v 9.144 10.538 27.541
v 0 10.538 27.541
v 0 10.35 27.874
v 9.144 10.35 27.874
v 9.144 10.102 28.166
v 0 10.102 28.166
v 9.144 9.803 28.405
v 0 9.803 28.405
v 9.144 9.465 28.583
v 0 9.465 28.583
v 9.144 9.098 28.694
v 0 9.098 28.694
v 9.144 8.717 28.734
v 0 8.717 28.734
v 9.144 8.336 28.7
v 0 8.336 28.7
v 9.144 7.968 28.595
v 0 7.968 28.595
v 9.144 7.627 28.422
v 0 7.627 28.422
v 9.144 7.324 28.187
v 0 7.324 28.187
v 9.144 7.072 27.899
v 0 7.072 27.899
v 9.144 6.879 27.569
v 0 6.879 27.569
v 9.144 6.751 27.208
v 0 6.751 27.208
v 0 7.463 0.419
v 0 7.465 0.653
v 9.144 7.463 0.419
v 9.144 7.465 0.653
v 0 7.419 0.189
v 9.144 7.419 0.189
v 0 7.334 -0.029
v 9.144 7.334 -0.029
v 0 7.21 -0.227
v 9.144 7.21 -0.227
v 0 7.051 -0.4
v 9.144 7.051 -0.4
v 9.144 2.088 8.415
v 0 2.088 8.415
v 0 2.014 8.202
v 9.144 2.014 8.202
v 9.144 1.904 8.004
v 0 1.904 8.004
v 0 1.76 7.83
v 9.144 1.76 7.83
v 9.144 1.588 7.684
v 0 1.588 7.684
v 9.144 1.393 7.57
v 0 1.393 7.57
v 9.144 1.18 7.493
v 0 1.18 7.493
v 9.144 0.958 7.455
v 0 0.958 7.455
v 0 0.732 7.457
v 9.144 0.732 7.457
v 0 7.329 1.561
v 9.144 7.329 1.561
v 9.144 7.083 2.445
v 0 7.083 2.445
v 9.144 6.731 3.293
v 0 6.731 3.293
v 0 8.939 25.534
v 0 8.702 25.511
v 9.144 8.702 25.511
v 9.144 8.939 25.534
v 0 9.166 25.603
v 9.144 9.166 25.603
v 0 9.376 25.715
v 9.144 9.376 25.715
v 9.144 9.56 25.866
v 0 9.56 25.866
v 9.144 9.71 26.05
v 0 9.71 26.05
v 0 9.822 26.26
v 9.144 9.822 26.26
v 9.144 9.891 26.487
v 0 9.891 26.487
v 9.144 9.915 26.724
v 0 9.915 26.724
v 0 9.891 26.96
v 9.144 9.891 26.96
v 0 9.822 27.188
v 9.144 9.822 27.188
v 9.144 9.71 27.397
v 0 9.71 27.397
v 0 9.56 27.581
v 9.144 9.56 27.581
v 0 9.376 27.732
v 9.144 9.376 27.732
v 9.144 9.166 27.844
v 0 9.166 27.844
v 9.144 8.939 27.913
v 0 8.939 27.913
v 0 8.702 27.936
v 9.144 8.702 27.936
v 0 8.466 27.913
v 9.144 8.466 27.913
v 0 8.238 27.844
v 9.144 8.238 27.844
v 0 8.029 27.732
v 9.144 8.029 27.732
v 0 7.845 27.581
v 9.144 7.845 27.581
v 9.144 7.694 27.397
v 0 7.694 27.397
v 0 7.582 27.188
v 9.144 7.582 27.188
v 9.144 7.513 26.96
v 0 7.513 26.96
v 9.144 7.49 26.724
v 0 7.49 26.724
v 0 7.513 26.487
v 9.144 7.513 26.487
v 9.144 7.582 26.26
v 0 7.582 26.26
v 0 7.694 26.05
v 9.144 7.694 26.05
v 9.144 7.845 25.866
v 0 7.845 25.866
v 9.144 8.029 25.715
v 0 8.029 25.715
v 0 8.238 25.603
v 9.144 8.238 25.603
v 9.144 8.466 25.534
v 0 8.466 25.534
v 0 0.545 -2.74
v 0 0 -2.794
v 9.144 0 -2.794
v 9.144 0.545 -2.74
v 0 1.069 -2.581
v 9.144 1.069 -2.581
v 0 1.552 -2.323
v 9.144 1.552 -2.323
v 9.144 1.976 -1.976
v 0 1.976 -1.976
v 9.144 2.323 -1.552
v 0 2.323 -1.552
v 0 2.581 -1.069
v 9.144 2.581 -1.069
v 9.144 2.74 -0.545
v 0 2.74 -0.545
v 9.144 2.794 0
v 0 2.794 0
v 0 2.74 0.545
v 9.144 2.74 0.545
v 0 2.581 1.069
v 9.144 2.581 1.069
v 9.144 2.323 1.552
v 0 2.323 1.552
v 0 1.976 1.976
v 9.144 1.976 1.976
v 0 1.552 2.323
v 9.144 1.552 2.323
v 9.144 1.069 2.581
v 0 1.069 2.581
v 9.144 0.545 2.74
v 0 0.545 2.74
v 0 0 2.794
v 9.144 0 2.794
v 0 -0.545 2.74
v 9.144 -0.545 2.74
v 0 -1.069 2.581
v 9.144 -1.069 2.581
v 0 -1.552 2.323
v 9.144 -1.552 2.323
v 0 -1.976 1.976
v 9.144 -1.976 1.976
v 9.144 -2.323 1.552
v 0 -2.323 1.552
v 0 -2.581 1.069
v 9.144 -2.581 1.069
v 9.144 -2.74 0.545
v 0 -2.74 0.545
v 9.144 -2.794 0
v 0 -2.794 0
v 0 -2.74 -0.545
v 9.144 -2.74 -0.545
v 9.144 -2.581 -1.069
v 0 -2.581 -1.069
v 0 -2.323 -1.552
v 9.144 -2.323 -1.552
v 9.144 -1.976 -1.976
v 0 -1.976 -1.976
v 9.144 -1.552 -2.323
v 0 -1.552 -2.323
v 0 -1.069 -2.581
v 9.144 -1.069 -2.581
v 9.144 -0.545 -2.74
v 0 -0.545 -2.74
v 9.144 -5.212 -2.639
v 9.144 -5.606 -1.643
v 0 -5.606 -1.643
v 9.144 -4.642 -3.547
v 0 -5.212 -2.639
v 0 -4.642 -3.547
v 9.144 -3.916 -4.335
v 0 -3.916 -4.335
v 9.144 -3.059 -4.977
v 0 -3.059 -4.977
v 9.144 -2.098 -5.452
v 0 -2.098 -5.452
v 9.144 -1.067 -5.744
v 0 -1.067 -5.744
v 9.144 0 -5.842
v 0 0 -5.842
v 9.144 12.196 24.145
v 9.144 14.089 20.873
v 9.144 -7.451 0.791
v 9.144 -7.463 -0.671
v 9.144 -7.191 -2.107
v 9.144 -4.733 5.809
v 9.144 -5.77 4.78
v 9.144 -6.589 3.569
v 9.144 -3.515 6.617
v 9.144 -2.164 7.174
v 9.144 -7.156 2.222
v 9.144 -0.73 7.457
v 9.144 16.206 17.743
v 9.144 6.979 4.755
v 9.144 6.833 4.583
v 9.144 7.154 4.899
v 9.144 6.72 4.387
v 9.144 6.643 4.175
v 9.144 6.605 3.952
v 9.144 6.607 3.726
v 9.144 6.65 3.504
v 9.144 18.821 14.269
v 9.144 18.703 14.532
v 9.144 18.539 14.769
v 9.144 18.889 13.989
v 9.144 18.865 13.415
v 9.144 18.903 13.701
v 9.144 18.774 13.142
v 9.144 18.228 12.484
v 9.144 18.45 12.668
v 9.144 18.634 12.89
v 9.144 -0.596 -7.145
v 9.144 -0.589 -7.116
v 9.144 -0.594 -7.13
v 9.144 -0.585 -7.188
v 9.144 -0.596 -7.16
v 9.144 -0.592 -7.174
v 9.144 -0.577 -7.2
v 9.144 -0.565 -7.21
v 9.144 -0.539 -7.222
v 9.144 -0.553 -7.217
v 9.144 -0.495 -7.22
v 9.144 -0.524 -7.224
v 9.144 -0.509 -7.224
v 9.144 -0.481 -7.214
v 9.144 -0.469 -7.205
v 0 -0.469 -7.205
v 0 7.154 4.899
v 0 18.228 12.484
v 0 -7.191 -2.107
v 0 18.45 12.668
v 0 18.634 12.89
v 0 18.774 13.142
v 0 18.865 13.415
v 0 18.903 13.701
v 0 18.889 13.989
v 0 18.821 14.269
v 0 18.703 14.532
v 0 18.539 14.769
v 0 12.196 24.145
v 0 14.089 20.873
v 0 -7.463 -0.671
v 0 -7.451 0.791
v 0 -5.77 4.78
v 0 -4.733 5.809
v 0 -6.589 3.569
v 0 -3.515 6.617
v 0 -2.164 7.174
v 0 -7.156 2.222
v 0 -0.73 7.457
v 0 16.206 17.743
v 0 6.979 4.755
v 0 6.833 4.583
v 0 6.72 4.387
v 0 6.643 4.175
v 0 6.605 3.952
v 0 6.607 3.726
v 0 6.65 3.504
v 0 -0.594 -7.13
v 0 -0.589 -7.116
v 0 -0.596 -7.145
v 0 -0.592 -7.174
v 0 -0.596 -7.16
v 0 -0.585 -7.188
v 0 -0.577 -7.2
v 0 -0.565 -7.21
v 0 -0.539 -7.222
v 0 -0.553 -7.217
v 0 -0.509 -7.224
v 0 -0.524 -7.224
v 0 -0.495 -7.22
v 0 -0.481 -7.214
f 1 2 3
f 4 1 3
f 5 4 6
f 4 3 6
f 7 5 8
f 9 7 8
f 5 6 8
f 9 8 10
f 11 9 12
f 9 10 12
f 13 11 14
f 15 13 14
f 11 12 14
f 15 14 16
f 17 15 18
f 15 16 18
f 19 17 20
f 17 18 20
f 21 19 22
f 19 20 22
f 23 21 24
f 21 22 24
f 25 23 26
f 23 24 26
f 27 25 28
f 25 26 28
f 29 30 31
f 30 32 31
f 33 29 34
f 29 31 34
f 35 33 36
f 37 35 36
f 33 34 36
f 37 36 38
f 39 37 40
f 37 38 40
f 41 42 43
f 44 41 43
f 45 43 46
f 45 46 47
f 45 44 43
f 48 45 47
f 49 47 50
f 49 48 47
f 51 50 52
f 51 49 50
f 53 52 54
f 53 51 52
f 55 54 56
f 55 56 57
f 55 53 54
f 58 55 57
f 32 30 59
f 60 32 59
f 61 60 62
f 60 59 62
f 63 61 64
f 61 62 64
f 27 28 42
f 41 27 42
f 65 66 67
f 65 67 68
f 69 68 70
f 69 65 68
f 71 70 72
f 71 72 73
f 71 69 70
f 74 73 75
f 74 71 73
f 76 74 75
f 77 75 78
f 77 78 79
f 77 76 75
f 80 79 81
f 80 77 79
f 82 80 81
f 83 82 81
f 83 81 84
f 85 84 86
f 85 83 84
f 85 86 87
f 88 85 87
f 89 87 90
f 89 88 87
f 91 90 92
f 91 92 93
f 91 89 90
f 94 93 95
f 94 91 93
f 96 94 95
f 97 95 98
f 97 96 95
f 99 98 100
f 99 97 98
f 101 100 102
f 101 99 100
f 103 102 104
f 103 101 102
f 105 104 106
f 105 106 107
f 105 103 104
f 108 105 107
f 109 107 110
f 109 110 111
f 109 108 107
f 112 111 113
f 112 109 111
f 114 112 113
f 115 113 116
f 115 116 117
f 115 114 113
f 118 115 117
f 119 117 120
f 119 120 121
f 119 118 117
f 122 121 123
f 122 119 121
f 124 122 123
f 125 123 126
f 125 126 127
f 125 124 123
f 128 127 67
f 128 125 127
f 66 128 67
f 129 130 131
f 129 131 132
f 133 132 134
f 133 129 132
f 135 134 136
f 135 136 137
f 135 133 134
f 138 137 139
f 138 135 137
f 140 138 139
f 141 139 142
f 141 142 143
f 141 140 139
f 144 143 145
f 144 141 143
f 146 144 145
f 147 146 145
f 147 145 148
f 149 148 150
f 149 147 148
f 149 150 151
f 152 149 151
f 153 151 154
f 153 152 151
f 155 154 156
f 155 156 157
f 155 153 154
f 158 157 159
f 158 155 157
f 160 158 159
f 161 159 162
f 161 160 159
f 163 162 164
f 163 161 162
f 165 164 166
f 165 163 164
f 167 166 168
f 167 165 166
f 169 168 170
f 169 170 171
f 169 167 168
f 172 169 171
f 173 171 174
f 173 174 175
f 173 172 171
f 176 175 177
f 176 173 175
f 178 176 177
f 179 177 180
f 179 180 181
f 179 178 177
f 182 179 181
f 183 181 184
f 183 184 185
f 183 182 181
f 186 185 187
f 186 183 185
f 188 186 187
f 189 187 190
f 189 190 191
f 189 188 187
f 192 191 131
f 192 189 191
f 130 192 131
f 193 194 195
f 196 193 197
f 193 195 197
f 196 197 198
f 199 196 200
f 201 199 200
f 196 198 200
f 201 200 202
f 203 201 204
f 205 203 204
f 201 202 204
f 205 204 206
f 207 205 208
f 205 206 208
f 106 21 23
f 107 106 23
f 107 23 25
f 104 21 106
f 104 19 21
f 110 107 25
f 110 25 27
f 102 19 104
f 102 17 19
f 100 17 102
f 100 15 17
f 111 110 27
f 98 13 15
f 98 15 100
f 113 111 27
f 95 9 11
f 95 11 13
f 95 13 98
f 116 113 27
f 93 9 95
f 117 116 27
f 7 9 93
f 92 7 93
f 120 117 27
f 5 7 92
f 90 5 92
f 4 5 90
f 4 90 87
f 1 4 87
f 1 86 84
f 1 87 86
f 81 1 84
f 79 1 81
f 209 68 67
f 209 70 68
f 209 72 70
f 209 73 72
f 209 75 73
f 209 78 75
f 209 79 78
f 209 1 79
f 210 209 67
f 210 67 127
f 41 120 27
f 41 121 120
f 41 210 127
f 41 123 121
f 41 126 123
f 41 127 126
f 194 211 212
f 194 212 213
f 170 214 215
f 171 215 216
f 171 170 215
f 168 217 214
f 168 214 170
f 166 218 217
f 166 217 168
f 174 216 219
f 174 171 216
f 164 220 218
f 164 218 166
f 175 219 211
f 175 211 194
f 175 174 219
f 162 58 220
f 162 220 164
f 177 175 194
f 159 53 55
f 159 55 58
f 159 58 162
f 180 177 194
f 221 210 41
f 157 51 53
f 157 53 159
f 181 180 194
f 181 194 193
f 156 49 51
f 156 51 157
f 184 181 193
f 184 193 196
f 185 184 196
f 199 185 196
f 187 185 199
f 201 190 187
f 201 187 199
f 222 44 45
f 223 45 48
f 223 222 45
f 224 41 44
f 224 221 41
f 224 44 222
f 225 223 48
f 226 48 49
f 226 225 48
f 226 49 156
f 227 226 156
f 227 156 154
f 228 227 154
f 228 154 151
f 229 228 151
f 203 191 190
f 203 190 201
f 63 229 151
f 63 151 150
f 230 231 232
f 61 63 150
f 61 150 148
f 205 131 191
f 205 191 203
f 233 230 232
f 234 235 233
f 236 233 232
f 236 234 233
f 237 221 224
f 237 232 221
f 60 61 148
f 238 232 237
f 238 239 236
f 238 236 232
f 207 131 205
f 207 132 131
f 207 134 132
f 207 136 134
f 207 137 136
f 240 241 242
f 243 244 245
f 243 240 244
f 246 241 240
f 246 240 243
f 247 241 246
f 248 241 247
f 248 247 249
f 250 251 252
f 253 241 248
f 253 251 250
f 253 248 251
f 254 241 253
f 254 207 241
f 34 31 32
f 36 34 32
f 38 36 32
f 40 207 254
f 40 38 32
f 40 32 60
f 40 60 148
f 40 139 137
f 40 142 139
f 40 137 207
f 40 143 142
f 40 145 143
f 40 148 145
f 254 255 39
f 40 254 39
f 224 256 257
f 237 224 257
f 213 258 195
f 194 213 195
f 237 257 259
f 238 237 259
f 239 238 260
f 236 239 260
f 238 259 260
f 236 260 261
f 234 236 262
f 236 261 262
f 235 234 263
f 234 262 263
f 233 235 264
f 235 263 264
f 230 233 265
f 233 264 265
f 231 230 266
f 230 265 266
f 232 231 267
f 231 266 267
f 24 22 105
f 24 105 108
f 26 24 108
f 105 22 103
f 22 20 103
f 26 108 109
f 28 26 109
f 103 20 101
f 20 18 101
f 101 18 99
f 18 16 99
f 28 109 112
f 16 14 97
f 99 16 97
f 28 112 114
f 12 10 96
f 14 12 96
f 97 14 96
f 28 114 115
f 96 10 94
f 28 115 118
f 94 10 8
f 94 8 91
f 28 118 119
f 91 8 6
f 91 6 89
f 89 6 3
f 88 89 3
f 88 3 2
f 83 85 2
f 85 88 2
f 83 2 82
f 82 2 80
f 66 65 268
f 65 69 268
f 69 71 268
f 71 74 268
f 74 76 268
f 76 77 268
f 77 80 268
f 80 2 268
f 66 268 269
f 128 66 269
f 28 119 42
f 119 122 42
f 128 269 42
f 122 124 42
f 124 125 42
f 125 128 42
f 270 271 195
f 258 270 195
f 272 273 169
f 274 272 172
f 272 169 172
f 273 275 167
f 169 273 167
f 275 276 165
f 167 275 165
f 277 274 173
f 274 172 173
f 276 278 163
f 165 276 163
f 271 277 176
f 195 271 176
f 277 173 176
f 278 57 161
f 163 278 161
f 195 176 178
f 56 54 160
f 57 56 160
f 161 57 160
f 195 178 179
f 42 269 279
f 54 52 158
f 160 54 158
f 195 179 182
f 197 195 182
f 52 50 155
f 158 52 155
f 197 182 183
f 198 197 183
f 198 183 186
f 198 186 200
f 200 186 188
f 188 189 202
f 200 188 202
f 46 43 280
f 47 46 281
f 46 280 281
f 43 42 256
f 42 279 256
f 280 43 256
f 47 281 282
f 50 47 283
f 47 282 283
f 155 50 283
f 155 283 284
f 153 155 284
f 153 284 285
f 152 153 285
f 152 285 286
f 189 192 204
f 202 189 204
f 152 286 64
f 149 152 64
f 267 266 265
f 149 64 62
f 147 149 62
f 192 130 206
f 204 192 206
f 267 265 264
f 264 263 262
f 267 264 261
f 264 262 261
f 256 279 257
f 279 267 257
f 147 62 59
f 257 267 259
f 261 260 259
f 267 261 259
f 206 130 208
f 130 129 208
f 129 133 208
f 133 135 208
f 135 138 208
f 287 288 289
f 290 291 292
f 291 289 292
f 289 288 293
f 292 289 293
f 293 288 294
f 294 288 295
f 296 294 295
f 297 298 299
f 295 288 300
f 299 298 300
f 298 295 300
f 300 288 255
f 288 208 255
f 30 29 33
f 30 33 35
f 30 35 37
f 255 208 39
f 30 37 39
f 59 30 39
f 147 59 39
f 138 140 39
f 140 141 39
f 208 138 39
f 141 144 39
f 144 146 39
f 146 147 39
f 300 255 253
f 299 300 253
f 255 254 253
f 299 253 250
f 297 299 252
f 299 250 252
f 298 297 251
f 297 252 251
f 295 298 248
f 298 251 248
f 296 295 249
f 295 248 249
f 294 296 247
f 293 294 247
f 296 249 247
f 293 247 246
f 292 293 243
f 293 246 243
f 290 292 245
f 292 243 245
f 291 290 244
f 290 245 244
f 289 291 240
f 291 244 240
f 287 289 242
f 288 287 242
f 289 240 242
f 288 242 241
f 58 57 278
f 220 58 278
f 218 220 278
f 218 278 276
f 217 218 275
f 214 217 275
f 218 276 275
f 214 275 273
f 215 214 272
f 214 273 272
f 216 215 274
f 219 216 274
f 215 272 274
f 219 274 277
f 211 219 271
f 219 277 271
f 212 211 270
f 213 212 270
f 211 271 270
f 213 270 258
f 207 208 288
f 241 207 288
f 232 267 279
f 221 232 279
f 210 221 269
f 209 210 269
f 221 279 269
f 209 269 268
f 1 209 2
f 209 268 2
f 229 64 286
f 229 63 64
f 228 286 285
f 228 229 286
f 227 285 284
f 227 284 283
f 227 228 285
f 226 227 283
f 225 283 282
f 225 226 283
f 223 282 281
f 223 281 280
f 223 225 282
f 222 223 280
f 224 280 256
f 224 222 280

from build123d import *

# Parameters (mm, degrees)
SKETCH1_R           = 2.794
SKETCH1_R_2         = 1.212486465
BOSS_EXTRUDE1_DEPTH = 9.144
FILLET1_R           = 0.0762
FILLET2_R           = 1.27
FILLET3_R           = 1.27
FILLET4_R           = 1.27


with BuildPart() as part:
    # Sketch1 → Boss-Extrude1 (new body)
    with BuildSketch(Plane(origin=(0, 0, 0), x_dir=(0, 0, -1), z_dir=(1, 0, 0))):
        with BuildLine():
            Line((7.455728261, -0.746434927), (0, 7.493))
            ThreePointArc((0, 7.493), (-2.216071025, 7.157798419), (-4.23386886, 6.182184362))
            Line((-4.23386886, 6.182184362), (-12.48371449, 18.228392766))
            ThreePointArc((-12.48371449, 18.228392766), (-13.557344424, 18.890595677), (-14.768732641, 18.538839342))
            ThreePointArc((-14.768732641, 18.538839342), (-20.873202748, 14.088773121), (-27.541235985, 10.538424208))
            ThreePointArc((-27.541235985, 10.538424208), (-28.725821969, 8.525909619), (-27.207679666, 6.751451146))
            Line((-27.207679666, 6.751451146), (-7.27244078, 1.804620212))
            ThreePointArc((-7.27244078, 1.804620212), (-5.186520816, -5.407869342), (2.106798928, -7.190719524))
            Line((2.106798928, -7.190719524), (1.642588995, -5.606323697))
            ThreePointArc((1.642588995, -5.606323697), (4.675733574, -3.50235343), (5.842, 0))
            Line((5.842, 0), (7.455728261, -0.746434927))
        make_face()
        Circle(SKETCH1_R, mode=Mode.SUBTRACT)
        with Locations((-26.723594694, 8.702265656)):
            Circle(SKETCH1_R_2, mode=Mode.SUBTRACT)
    extrude(amount=BOSS_EXTRUDE1_DEPTH)

    # Fillet1
    fillet1_edges = [part.edges().sort_by_distance(p)[0] for p in [
        (4.572, -0.746434927, -7.455728261),
    ]]
    fillet(fillet1_edges, radius=FILLET1_R)

    # Fillet2
    fillet2_edges = [part.edges().sort_by_distance(p)[0] for p in [
        (4.572, 6.182184362, 4.23386886),
    ]]
    fillet(fillet2_edges, radius=FILLET2_R)

    # Fillet3
    fillet3_edges = [part.edges().sort_by_distance(p)[0] for p in [
        (4.572, 7.493, 0),
    ]]
    fillet(fillet3_edges, radius=FILLET3_R)

    # Fillet4
    fillet4_edges = [part.edges().sort_by_distance(p)[0] for p in [
        (4.572, 1.804620212, 7.27244078),
    ]]
    fillet(fillet4_edges, radius=FILLET4_R)


solid = part.part
